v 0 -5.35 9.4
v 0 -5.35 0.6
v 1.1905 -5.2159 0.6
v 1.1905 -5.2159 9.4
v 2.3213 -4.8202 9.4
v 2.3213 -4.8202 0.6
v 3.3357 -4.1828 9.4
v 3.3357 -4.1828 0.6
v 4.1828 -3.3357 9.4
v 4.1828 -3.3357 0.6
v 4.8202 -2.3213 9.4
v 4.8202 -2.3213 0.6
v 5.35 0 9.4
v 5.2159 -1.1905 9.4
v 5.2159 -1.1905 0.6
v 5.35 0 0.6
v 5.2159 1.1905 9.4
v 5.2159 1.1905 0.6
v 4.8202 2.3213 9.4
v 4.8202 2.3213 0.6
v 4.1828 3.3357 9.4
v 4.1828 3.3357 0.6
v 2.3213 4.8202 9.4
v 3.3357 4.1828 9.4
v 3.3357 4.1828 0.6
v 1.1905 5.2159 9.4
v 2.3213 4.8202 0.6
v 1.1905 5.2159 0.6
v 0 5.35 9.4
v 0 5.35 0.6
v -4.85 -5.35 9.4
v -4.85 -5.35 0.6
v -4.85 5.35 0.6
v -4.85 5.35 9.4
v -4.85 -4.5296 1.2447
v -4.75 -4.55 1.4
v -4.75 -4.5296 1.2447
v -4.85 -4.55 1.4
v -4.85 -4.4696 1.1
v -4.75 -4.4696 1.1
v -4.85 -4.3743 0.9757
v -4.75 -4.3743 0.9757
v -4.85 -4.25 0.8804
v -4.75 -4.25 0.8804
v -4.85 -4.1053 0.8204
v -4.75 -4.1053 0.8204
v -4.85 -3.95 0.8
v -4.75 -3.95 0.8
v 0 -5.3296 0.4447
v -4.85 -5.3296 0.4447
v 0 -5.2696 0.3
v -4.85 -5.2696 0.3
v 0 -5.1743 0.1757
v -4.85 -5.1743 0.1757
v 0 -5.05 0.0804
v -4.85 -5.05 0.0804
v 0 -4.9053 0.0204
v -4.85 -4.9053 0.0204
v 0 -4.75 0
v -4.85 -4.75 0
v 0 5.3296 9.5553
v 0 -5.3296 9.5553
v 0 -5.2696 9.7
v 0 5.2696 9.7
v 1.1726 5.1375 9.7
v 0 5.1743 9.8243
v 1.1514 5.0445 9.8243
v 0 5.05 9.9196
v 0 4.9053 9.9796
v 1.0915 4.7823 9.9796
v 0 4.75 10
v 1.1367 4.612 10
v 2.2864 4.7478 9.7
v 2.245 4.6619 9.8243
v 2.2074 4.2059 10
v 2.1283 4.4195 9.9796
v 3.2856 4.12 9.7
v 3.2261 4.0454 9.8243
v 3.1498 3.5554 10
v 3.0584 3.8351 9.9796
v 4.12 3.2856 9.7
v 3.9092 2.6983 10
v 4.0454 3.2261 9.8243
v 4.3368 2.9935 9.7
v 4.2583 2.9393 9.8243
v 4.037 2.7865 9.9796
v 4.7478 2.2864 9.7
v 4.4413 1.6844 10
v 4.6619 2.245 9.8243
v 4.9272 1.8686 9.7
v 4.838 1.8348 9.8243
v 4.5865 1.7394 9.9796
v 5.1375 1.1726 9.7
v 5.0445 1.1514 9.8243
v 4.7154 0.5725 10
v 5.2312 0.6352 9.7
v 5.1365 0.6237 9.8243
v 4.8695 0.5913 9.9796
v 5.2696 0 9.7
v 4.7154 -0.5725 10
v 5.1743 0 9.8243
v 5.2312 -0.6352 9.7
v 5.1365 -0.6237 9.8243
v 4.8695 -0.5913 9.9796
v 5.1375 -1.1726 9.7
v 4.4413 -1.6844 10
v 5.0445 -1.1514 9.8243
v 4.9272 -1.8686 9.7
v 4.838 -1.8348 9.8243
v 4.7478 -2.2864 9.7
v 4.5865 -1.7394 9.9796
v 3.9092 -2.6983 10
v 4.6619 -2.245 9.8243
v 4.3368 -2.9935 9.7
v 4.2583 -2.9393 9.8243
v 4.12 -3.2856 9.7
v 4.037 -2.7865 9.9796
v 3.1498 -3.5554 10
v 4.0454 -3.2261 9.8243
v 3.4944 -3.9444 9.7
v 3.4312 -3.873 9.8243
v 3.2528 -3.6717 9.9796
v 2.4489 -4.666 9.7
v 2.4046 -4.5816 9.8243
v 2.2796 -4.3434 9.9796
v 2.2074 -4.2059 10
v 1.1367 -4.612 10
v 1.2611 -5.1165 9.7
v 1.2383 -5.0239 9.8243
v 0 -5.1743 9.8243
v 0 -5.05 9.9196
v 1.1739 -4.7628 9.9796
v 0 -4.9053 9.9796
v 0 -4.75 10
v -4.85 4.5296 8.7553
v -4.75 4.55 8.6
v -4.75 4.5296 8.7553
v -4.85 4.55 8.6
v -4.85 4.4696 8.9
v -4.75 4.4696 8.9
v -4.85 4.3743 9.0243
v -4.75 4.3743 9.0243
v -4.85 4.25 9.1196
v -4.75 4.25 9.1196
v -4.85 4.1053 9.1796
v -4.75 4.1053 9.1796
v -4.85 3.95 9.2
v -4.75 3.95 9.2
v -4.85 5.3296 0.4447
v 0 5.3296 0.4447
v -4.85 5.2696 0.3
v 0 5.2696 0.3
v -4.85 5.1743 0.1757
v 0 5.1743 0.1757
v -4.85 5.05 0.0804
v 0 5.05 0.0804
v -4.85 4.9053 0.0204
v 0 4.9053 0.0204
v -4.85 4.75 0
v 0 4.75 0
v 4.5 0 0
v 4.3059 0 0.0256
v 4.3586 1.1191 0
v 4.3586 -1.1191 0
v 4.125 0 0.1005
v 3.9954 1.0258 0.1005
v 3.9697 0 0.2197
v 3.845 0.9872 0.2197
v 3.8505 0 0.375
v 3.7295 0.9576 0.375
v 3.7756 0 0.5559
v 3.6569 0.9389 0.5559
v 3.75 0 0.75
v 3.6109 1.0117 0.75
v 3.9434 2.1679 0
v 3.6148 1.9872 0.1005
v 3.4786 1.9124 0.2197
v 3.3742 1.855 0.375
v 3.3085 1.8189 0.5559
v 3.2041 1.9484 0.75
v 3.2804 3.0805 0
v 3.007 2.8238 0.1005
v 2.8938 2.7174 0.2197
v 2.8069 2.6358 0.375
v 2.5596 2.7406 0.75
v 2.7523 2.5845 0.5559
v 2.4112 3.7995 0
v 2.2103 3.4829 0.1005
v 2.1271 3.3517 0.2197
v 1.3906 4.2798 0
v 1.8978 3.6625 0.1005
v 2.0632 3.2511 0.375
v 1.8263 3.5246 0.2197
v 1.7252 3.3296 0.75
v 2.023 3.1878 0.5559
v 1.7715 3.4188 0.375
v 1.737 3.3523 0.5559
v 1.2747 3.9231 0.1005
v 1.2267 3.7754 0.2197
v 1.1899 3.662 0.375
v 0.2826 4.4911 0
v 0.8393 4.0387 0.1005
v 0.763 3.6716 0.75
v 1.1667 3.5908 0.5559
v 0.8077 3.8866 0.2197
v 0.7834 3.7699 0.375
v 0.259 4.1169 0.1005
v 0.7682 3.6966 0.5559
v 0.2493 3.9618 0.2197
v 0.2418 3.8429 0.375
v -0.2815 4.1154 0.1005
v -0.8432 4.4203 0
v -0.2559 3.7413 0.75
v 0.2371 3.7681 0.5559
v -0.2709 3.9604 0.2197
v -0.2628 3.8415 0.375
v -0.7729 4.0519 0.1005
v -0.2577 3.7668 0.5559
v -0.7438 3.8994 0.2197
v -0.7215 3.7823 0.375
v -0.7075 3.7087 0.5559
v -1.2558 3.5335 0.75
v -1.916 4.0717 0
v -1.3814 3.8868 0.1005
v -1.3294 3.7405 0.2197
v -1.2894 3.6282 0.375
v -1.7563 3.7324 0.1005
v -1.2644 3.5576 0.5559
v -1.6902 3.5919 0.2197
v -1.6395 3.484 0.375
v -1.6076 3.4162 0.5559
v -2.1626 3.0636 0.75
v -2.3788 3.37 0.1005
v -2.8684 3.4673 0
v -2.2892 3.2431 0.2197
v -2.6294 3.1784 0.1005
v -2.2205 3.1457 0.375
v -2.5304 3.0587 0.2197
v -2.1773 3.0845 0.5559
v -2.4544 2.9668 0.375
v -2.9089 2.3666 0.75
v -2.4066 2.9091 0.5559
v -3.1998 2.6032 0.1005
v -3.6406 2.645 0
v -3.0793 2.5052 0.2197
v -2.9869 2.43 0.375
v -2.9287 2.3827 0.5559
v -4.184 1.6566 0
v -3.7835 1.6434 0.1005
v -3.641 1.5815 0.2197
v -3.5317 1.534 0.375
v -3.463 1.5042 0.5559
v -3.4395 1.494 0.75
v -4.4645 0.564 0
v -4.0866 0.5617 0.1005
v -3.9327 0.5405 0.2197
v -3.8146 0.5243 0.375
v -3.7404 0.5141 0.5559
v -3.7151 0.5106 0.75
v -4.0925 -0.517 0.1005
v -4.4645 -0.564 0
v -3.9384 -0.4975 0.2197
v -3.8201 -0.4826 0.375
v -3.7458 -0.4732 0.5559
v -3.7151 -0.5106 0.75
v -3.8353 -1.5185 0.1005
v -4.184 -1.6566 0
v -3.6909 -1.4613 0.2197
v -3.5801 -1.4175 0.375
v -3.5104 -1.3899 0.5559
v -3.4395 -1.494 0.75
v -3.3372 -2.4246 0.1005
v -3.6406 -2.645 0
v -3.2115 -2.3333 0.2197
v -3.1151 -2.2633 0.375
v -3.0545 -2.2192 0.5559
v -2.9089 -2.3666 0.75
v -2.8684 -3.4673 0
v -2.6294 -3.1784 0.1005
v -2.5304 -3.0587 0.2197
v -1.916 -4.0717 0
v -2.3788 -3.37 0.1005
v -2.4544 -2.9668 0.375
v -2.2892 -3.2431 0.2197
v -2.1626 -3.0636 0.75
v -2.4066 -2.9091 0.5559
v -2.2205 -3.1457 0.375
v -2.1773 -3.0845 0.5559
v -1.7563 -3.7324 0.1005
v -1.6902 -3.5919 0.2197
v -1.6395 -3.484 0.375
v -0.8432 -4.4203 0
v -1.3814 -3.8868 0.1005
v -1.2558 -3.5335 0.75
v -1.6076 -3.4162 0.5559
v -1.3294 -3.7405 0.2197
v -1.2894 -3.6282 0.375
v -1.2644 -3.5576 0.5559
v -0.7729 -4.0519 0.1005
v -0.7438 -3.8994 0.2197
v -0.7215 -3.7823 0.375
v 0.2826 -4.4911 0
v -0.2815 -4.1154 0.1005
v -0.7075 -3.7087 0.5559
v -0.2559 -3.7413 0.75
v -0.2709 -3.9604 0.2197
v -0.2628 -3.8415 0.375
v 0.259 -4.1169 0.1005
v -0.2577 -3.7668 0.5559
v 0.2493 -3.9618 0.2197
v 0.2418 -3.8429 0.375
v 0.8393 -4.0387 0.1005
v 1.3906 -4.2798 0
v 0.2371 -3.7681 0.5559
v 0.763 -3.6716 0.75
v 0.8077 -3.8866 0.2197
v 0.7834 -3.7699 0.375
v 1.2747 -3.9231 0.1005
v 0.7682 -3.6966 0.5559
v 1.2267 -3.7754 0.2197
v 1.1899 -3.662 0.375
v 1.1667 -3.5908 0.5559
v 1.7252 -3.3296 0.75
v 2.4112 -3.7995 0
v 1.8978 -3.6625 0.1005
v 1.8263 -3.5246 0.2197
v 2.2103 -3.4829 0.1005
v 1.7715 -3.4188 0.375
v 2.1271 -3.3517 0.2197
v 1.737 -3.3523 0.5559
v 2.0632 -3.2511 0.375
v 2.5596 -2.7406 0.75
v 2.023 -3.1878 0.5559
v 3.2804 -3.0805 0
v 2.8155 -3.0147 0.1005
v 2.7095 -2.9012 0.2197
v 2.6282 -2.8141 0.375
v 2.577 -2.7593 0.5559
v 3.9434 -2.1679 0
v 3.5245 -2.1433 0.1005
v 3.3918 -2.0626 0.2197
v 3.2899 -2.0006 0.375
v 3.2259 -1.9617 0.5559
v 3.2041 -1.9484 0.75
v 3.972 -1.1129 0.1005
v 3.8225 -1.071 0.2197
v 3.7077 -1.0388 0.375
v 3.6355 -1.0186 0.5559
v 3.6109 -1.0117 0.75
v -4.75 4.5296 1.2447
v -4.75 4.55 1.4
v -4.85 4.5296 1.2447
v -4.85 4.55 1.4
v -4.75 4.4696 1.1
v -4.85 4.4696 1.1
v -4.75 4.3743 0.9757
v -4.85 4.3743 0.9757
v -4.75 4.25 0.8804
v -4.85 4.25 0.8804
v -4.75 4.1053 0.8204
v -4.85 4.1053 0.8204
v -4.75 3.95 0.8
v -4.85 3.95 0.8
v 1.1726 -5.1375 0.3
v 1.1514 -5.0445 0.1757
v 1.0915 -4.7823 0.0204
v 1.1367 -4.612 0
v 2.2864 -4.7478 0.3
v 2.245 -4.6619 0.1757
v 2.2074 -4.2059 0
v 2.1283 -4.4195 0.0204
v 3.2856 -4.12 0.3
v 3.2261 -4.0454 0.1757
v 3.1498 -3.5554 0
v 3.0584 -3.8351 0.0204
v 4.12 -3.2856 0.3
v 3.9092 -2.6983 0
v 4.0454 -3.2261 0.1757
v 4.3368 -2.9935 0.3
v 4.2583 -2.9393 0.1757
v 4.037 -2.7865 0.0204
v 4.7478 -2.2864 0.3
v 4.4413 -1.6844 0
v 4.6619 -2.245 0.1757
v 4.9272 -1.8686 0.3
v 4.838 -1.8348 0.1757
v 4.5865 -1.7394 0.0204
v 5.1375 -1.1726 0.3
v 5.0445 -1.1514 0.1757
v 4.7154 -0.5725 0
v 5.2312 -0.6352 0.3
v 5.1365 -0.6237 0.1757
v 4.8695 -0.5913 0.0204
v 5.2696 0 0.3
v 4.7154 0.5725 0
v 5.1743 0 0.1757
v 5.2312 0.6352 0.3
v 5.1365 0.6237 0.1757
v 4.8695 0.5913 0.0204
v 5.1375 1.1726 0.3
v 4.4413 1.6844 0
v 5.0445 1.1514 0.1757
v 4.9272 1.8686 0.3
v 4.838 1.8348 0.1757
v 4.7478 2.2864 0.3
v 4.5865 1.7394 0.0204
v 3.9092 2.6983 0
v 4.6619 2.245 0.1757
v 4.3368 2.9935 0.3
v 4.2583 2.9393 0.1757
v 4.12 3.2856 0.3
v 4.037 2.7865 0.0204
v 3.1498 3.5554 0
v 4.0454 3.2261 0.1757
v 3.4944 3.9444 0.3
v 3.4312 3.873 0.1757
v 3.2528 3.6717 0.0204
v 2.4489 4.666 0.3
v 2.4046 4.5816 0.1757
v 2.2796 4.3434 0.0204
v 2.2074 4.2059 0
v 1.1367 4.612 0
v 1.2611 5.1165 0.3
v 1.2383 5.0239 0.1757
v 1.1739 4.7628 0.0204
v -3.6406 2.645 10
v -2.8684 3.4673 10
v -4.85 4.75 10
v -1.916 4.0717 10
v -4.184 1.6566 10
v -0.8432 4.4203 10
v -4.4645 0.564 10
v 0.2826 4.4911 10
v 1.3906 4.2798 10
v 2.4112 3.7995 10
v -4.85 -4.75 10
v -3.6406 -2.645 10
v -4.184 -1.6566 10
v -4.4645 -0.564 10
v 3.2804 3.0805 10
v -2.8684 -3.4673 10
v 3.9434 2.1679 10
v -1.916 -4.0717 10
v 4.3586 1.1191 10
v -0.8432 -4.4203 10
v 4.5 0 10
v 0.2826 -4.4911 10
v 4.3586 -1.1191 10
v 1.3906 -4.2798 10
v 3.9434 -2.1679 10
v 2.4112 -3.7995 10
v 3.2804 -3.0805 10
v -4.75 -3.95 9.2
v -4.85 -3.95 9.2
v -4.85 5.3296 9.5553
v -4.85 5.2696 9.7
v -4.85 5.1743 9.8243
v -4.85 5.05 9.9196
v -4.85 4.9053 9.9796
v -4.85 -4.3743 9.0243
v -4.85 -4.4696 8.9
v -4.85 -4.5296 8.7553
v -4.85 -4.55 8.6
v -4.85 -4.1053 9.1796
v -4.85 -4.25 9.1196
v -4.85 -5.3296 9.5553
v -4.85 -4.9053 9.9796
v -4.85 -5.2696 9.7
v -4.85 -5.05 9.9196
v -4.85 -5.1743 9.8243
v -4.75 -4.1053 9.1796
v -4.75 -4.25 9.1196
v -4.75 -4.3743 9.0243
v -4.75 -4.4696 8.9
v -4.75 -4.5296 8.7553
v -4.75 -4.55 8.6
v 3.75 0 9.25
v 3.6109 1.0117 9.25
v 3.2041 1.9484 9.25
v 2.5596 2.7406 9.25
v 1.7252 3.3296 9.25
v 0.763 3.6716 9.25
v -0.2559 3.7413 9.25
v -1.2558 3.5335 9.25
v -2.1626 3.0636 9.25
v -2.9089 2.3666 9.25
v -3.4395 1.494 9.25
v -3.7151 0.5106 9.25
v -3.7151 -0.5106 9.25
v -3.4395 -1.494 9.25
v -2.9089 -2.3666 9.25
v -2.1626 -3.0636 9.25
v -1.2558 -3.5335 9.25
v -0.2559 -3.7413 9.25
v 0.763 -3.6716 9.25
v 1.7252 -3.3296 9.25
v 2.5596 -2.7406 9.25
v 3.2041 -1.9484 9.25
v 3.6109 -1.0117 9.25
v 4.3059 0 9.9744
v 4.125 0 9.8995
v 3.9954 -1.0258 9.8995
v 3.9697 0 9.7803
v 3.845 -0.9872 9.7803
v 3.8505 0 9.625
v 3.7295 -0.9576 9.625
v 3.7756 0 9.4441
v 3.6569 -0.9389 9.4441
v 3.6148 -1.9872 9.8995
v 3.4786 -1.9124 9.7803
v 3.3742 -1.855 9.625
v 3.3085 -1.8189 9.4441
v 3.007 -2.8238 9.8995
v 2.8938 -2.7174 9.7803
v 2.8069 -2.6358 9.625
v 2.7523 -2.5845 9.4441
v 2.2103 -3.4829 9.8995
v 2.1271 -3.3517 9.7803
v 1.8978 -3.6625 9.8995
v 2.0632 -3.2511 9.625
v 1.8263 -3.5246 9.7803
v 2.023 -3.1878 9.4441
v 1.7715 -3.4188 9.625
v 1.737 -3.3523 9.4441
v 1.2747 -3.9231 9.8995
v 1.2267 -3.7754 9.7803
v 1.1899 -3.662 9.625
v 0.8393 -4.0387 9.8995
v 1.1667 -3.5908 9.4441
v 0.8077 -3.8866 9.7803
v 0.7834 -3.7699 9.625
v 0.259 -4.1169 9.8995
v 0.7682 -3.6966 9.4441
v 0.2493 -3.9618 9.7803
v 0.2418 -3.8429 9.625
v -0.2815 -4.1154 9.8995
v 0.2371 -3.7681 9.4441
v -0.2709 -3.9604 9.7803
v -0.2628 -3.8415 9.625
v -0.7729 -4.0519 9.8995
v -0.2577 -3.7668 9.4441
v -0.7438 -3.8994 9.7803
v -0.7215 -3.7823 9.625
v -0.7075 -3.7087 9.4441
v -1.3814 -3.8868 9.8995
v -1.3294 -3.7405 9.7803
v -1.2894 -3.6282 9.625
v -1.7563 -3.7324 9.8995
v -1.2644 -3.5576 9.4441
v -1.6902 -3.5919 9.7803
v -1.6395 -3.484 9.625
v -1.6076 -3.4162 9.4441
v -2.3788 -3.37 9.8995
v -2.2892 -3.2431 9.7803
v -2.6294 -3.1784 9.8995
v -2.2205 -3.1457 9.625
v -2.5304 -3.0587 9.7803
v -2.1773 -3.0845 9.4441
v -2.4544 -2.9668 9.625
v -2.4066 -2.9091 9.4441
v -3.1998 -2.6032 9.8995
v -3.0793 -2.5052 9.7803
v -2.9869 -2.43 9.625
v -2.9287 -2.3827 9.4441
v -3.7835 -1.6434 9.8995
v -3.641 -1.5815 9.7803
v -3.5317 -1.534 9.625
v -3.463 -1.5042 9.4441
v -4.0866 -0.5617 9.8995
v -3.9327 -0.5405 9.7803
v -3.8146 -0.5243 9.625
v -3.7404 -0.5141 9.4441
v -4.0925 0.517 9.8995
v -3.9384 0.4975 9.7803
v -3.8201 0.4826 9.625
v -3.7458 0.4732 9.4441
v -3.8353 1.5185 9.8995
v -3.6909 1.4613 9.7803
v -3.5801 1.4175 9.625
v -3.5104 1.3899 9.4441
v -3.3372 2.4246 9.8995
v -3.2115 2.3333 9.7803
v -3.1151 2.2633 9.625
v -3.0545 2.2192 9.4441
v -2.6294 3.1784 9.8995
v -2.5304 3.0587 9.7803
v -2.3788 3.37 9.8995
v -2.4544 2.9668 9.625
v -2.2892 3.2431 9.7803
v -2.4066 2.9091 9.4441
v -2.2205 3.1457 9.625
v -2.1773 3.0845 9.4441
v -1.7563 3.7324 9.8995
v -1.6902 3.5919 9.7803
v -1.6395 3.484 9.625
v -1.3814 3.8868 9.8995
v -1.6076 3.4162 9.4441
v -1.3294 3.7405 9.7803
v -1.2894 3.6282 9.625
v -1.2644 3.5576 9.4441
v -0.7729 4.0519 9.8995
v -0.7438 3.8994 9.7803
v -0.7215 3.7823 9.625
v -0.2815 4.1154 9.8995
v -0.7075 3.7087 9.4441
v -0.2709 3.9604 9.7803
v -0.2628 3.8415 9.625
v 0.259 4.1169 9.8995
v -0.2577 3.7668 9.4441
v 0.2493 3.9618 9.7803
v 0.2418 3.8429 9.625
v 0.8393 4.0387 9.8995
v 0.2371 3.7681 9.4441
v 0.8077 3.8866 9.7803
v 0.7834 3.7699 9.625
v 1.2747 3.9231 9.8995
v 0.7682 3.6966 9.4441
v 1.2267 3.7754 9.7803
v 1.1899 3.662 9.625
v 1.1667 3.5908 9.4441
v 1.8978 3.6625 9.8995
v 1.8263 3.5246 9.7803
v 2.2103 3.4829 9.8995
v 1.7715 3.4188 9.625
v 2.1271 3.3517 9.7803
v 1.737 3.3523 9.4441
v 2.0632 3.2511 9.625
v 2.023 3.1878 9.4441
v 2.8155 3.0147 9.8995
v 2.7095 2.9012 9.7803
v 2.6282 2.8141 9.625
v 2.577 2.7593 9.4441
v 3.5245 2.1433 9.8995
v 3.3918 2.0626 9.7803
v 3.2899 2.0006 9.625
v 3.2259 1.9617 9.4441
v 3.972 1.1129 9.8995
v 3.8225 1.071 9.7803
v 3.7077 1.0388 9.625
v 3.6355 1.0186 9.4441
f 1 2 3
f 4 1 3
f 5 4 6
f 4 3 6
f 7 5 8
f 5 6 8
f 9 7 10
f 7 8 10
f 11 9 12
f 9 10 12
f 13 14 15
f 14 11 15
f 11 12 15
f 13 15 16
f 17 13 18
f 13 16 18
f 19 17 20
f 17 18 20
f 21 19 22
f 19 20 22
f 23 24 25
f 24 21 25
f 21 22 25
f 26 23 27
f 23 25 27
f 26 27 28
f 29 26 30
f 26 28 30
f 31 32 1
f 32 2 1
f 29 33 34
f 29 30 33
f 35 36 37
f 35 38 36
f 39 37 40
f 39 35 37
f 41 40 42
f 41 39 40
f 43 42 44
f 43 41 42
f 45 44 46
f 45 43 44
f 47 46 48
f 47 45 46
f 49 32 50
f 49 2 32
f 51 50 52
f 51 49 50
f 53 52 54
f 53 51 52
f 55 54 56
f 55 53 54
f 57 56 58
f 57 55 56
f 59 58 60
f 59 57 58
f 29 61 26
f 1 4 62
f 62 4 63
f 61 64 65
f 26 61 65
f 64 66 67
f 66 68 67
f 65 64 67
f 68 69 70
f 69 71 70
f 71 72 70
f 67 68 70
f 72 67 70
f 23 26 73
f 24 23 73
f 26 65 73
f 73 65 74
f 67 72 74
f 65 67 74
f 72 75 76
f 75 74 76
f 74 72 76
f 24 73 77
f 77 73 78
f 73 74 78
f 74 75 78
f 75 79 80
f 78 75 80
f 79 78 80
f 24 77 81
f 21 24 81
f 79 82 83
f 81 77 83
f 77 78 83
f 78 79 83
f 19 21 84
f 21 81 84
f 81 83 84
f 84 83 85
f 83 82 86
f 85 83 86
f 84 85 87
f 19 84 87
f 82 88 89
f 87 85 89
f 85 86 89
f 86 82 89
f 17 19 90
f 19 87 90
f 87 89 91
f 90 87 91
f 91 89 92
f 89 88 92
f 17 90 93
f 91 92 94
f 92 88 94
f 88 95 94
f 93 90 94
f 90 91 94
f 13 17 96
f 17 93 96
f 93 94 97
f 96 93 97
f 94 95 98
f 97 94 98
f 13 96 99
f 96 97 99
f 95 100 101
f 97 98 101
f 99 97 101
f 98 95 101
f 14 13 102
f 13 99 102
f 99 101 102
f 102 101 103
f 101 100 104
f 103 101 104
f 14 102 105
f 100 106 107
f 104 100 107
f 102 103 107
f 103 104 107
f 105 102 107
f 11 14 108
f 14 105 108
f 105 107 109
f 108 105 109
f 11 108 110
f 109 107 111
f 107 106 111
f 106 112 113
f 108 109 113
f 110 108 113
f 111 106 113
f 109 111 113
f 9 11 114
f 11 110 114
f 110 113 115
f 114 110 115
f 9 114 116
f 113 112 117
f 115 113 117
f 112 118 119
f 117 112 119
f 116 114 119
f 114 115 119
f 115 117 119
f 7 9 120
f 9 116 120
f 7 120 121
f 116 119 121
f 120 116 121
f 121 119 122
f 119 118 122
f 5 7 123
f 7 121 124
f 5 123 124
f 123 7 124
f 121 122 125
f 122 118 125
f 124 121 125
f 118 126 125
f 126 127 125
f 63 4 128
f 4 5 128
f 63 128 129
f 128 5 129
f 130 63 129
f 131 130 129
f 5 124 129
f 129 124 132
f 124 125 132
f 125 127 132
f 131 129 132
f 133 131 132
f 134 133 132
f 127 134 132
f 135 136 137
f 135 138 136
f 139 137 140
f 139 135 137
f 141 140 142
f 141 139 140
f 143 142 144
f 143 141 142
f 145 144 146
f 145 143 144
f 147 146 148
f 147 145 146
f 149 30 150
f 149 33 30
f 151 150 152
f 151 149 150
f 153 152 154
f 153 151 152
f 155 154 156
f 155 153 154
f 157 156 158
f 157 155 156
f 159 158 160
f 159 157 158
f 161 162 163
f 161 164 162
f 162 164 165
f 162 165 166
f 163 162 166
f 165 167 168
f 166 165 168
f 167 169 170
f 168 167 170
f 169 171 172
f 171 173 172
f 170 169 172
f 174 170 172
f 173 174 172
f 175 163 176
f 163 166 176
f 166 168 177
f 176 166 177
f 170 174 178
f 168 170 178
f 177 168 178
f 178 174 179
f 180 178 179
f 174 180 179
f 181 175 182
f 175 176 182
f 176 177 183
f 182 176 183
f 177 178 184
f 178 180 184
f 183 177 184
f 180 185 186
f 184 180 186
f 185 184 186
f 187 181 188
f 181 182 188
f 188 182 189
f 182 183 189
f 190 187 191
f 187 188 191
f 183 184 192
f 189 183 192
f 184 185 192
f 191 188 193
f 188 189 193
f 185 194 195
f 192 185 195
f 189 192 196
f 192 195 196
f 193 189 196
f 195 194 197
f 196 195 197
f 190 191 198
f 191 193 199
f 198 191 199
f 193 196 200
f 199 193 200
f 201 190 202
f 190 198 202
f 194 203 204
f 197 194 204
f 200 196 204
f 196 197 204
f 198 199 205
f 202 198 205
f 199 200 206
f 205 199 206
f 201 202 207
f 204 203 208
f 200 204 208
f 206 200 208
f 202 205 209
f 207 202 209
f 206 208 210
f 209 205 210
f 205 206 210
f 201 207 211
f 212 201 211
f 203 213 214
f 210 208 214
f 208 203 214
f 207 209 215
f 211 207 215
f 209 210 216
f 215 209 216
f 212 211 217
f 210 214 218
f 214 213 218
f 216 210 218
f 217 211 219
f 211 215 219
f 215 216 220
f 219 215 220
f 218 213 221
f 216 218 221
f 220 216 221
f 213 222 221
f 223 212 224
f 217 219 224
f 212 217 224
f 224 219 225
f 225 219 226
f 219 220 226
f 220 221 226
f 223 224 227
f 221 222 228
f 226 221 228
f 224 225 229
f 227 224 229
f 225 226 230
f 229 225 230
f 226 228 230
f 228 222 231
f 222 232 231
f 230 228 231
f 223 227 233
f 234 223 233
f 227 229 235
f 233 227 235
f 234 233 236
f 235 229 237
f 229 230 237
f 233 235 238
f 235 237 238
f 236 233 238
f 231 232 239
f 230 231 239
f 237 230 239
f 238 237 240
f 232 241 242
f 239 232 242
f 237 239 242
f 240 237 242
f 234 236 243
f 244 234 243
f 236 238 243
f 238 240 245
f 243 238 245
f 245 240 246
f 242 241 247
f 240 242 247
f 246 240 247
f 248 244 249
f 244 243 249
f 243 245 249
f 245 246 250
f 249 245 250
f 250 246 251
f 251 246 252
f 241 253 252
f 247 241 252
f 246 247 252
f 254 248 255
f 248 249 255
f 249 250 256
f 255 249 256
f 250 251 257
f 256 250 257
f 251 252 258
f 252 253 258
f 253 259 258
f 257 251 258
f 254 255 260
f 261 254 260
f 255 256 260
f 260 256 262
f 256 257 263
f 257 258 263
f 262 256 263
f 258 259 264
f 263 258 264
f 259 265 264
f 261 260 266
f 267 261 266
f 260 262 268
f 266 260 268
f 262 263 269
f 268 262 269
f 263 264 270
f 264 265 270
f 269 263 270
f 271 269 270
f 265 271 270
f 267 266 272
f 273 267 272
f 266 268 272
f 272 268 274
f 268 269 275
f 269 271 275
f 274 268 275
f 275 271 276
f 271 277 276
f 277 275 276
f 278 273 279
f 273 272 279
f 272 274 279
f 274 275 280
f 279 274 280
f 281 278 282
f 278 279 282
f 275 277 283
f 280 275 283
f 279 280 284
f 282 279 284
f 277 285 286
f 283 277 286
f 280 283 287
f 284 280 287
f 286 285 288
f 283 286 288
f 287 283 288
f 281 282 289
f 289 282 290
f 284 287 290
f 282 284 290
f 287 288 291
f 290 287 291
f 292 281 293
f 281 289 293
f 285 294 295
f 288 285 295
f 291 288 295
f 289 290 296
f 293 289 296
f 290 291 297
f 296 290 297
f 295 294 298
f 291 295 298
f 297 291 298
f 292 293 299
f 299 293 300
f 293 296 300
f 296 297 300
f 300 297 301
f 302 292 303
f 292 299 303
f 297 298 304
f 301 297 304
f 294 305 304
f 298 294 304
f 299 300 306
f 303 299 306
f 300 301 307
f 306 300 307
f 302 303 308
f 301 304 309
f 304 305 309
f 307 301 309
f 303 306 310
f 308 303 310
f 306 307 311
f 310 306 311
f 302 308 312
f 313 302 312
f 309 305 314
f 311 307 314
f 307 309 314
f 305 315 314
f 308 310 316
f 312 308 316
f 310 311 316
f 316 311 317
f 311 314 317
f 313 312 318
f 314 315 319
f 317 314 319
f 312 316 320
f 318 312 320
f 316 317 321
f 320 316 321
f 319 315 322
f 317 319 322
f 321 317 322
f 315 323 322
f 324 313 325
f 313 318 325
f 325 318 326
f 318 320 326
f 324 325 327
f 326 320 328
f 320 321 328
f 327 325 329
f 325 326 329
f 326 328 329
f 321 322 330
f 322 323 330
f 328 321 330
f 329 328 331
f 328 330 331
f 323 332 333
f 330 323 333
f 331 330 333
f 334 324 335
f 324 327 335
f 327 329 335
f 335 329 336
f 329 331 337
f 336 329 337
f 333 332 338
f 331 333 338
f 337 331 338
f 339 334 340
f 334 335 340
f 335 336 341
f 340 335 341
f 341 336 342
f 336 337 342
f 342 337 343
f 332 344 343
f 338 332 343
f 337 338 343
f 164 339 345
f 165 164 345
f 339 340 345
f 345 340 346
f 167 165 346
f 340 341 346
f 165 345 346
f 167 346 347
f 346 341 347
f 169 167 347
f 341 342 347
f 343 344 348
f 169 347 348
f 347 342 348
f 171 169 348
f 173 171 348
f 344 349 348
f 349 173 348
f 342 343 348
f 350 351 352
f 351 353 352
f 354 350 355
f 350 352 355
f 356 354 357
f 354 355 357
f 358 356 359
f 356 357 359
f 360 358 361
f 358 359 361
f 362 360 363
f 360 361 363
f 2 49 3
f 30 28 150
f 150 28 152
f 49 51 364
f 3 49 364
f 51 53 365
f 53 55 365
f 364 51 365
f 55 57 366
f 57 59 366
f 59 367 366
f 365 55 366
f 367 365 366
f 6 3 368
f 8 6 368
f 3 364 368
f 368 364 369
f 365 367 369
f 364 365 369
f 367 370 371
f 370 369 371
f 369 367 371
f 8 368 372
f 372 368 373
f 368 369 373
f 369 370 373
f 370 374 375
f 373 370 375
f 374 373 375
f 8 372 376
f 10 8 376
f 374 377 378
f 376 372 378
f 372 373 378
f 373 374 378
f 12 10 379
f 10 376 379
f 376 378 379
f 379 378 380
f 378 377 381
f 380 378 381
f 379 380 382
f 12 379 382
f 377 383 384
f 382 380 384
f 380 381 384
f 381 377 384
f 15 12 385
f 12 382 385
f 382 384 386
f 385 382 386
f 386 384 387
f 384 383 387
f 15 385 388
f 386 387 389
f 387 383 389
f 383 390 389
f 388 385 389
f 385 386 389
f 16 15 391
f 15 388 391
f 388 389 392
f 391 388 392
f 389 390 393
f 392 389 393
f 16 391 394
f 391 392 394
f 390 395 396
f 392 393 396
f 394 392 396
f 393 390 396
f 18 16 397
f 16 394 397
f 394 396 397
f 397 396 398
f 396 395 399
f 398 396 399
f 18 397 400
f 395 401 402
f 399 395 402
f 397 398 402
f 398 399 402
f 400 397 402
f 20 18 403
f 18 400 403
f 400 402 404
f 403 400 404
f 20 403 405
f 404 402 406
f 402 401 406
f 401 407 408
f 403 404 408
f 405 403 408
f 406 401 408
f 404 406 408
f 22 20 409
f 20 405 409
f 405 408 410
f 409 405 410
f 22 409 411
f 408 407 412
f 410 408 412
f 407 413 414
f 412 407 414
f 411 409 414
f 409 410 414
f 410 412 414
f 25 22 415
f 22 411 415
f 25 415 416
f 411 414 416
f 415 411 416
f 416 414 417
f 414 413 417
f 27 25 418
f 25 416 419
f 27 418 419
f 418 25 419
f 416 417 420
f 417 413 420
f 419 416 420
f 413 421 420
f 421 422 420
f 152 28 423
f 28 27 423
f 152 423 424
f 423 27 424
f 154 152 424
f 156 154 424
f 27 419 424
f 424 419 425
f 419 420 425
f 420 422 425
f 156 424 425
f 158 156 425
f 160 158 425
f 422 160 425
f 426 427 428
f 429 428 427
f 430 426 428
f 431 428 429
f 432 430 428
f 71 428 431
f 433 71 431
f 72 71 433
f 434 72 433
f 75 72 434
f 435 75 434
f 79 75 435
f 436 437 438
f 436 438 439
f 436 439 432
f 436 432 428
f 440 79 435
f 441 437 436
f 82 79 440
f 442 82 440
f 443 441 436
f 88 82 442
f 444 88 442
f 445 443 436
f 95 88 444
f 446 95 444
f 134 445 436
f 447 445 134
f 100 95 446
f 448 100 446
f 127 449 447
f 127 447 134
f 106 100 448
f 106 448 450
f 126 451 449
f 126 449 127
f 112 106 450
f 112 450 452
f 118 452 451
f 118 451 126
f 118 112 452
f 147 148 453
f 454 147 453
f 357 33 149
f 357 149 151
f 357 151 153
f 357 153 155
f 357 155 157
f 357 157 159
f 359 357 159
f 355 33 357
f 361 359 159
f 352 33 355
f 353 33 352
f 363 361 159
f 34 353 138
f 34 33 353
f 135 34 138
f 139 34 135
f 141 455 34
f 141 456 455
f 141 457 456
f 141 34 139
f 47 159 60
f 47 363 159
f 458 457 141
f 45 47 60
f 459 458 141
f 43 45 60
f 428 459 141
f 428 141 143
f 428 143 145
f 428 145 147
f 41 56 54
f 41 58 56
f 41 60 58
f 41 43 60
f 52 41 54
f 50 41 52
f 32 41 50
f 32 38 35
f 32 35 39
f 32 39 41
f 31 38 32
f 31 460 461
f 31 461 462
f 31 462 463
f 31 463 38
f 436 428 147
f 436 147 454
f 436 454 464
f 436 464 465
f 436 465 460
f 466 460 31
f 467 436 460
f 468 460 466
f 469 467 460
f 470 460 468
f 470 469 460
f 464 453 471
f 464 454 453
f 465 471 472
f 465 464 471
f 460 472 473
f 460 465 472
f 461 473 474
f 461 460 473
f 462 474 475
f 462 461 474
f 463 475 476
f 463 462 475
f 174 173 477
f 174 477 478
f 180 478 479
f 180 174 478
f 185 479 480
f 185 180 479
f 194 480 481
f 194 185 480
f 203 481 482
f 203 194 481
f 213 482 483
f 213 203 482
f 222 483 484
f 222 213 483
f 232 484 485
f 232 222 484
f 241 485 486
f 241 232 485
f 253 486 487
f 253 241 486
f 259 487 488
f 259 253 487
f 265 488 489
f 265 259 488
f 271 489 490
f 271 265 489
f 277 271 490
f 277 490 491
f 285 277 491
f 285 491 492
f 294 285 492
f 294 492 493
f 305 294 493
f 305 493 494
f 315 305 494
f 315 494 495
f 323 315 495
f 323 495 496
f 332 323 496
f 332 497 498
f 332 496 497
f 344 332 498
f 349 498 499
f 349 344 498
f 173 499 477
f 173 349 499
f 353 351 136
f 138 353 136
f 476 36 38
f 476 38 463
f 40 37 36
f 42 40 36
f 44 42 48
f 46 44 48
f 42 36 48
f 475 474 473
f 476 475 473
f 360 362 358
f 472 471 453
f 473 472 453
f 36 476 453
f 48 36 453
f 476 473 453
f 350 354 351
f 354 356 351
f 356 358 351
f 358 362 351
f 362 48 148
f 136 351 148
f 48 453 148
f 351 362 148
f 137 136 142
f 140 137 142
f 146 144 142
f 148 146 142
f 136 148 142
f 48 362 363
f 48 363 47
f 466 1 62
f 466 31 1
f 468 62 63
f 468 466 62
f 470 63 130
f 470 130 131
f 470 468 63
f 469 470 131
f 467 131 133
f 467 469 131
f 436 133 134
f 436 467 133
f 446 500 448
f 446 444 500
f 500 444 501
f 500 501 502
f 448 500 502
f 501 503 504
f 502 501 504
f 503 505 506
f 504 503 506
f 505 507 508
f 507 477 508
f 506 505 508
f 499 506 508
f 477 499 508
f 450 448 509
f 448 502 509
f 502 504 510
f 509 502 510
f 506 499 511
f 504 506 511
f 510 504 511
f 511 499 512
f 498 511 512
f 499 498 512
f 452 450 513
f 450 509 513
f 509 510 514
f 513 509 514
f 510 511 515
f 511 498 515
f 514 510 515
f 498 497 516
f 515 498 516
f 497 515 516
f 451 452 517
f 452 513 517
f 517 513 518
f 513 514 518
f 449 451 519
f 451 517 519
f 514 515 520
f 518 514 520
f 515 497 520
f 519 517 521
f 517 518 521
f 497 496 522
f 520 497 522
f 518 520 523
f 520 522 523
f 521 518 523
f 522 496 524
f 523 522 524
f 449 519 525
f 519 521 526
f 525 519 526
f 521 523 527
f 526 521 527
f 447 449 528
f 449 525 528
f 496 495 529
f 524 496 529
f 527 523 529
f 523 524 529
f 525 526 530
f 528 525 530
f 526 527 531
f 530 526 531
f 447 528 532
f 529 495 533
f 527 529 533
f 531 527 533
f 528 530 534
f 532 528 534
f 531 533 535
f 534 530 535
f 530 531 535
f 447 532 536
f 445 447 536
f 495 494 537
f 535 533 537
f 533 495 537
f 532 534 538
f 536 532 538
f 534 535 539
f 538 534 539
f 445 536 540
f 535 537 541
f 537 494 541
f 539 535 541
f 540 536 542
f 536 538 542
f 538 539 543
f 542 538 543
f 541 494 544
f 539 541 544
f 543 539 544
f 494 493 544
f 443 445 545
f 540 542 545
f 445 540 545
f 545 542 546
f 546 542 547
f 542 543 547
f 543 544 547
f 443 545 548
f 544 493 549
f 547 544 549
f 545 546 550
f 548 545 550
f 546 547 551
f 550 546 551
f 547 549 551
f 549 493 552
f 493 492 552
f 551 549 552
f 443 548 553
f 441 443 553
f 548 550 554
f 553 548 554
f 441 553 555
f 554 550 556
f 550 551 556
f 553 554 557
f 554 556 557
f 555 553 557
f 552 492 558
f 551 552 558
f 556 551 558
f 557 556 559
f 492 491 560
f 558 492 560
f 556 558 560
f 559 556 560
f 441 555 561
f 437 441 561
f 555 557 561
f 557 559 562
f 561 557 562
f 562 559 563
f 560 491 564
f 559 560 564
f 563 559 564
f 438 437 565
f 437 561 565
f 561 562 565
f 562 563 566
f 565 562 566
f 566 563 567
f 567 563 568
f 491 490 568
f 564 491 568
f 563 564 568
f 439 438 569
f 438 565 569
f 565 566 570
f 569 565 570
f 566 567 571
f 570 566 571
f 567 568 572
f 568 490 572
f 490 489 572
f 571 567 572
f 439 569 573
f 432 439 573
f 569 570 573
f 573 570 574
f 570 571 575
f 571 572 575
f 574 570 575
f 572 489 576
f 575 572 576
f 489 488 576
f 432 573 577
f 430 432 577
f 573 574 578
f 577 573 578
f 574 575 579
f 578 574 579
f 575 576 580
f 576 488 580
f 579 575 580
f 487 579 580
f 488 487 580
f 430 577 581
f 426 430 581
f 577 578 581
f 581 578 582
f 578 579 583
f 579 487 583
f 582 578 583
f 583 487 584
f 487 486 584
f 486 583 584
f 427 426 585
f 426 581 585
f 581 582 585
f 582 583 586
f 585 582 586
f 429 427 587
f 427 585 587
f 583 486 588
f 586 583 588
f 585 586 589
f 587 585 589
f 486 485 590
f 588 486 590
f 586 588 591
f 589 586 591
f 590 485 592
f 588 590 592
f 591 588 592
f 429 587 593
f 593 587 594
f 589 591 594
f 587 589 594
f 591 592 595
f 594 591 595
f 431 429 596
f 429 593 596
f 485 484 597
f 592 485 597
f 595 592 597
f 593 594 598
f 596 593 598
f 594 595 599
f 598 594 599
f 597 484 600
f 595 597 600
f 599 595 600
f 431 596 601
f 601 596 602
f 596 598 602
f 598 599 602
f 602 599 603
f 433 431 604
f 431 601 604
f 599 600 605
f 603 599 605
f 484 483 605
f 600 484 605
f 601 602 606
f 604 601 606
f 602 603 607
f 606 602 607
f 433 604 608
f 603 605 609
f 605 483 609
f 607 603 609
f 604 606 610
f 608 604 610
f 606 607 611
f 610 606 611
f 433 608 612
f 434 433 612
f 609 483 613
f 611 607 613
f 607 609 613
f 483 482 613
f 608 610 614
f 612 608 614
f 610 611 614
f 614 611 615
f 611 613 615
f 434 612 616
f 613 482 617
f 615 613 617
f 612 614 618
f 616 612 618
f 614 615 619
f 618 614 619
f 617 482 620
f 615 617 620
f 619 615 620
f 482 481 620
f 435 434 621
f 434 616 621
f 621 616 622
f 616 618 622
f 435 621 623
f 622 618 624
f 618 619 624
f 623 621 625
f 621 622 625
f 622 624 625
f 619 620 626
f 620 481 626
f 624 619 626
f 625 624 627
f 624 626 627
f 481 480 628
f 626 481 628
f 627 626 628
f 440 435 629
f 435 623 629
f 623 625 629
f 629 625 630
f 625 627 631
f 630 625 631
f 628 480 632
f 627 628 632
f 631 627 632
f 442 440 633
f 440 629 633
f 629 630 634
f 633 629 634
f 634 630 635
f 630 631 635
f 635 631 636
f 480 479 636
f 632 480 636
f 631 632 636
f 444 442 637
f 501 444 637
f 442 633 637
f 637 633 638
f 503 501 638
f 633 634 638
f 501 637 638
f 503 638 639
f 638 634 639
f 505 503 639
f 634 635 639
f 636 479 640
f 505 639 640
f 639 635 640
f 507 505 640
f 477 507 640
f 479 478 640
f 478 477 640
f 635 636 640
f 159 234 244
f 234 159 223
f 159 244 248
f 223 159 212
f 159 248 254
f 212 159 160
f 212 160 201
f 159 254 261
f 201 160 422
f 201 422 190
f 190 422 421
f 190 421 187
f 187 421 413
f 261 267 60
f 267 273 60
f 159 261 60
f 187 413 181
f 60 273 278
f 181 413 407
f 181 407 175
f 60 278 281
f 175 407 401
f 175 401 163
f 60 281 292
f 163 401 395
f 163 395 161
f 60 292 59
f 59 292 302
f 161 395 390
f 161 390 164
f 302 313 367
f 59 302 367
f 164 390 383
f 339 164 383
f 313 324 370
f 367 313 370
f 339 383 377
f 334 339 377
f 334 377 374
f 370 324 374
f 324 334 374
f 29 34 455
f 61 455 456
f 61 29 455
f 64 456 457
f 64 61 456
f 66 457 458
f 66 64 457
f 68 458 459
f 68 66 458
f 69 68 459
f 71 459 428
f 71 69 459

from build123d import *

# Parameters (mm, degrees)
F0_R     = 5.35
F0_R_2   = 3.75
F1_DEPTH = 10
F2_W     = 10.7
F2_H     = 10
F3_DEPTH = 4.75
F4_W     = 7.811706725
F4_H     = 10
F5_DEPTH = 25
F6_DEPTH = 25
F7_W     = 10.7
F7_H     = 10
F7_W_2   = 9.1
F7_H_2   = 8.4
F8_DEPTH = 0.1
F9_R     = 0.6
F10_R    = 0.75


with BuildPart() as f1:
    # F0 (on Top) → F1 (new body)
    with BuildSketch(Plane.XY):
        Circle(F0_R)
        Circle(F0_R_2, mode=Mode.SUBTRACT)
        Circle(F0_R_2)
    extrude(amount=F1_DEPTH)

    # F2 (on Right) → F3 (join)
    with BuildSketch(Plane.YZ):
        with Locations((0, 5)):
            Rectangle(F2_W, F2_H)
    extrude(amount=-F3_DEPTH)

    # F4 (on face) → F5 (cut)
    with BuildSketch(Plane(origin=(-4.75, 0, 0), x_dir=(0, -1, 0), z_dir=(-1, 0, 0))):
        with Locations((1.4441466375, 5)):
            Rectangle(F4_W, F4_H)
    extrude(amount=F5_DEPTH, mode=Mode.SUBTRACT)

    # F0 (on Top) → F6 (cut)
    with BuildSketch(Plane.XY):
        Circle(F0_R_2)
    extrude(amount=F6_DEPTH, mode=Mode.SUBTRACT)

    # F7 (on face) → F8 (join)
    with BuildSketch(Plane(origin=(-4.75, 0, 0), x_dir=(0, -1, 0), z_dir=(-1, 0, 0))):
        with Locations((0, 5)):
            Rectangle(F7_W, F7_H)
        with Locations((0, 5)):
            Rectangle(F7_W_2, F7_H_2, mode=Mode.SUBTRACT)
    extrude(amount=F8_DEPTH)

    # F9
    f9_edges = [f1.edges().sort_by_distance(p)[0] for p in [
        (-2.425, 5.35, 10),
        (-2.425, 5.35, 0),
        (-2.425, -5.35, 0),
        (-2.425, -5.35, 10),
        (-4.8, 4.55, 9.2),
        (-4.8, -4.55, 9.2),
        (-4.8, -4.55, 0.8),
        (-4.8, 4.55, 0.8),
    ]]
    fillet(f9_edges, radius=F9_R)

    # F10
    f10_edges = [f1.edges().sort_by_distance(p)[0] for p in [
        (-3.75, 0, 0),
        (-3.75, 0, 10),
    ]]
    fillet(f10_edges, radius=F10_R)


solid = f1.part
